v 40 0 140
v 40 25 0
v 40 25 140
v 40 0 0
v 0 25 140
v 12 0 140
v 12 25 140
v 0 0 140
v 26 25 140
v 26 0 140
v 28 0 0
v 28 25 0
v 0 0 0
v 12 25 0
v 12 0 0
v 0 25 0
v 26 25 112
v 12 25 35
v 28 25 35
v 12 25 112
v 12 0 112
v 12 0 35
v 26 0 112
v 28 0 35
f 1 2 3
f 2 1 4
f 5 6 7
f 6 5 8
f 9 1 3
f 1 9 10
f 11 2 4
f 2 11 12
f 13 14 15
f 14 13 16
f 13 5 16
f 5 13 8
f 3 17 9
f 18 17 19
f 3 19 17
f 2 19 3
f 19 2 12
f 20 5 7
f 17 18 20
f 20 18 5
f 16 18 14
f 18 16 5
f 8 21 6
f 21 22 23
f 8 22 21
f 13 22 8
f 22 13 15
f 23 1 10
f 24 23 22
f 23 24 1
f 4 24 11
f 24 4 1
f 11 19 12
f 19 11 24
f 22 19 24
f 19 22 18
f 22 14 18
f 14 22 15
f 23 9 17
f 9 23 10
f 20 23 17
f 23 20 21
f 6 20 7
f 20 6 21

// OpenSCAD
cut_margin = 5;
rough_x = 40;
rough_y = 25;
rough_z = 140;

bottom_cut_x = 16;
bottom_cut_y = rough_y + cut_margin;
bottom_cut_z = 40;

module bottom_cut() {
       cube([bottom_cut_x, bottom_cut_y, bottom_cut_z]);
}


top_cut_x = 14;
top_cut_y = rough_y;
top_cut_z = 33;

module top_cut() {
       cube([top_cut_x, top_cut_y+cut_margin, top_cut_z+cut_margin]);
}

difference() {
  color([0,0, 0.8]) cube([rough_x, rough_y, rough_z]);
  color([0.4, 0,0.4]) translate([rough_x/2-bottom_cut_x/2, -cut_margin/2, -cut_margin]) bottom_cut();
  color([0.4, 0,0.4]) translate([rough_x/2-bottom_cut_x/2, -cut_margin/2, rough_z-top_cut_z+cut_margin]) top_cut();
}
